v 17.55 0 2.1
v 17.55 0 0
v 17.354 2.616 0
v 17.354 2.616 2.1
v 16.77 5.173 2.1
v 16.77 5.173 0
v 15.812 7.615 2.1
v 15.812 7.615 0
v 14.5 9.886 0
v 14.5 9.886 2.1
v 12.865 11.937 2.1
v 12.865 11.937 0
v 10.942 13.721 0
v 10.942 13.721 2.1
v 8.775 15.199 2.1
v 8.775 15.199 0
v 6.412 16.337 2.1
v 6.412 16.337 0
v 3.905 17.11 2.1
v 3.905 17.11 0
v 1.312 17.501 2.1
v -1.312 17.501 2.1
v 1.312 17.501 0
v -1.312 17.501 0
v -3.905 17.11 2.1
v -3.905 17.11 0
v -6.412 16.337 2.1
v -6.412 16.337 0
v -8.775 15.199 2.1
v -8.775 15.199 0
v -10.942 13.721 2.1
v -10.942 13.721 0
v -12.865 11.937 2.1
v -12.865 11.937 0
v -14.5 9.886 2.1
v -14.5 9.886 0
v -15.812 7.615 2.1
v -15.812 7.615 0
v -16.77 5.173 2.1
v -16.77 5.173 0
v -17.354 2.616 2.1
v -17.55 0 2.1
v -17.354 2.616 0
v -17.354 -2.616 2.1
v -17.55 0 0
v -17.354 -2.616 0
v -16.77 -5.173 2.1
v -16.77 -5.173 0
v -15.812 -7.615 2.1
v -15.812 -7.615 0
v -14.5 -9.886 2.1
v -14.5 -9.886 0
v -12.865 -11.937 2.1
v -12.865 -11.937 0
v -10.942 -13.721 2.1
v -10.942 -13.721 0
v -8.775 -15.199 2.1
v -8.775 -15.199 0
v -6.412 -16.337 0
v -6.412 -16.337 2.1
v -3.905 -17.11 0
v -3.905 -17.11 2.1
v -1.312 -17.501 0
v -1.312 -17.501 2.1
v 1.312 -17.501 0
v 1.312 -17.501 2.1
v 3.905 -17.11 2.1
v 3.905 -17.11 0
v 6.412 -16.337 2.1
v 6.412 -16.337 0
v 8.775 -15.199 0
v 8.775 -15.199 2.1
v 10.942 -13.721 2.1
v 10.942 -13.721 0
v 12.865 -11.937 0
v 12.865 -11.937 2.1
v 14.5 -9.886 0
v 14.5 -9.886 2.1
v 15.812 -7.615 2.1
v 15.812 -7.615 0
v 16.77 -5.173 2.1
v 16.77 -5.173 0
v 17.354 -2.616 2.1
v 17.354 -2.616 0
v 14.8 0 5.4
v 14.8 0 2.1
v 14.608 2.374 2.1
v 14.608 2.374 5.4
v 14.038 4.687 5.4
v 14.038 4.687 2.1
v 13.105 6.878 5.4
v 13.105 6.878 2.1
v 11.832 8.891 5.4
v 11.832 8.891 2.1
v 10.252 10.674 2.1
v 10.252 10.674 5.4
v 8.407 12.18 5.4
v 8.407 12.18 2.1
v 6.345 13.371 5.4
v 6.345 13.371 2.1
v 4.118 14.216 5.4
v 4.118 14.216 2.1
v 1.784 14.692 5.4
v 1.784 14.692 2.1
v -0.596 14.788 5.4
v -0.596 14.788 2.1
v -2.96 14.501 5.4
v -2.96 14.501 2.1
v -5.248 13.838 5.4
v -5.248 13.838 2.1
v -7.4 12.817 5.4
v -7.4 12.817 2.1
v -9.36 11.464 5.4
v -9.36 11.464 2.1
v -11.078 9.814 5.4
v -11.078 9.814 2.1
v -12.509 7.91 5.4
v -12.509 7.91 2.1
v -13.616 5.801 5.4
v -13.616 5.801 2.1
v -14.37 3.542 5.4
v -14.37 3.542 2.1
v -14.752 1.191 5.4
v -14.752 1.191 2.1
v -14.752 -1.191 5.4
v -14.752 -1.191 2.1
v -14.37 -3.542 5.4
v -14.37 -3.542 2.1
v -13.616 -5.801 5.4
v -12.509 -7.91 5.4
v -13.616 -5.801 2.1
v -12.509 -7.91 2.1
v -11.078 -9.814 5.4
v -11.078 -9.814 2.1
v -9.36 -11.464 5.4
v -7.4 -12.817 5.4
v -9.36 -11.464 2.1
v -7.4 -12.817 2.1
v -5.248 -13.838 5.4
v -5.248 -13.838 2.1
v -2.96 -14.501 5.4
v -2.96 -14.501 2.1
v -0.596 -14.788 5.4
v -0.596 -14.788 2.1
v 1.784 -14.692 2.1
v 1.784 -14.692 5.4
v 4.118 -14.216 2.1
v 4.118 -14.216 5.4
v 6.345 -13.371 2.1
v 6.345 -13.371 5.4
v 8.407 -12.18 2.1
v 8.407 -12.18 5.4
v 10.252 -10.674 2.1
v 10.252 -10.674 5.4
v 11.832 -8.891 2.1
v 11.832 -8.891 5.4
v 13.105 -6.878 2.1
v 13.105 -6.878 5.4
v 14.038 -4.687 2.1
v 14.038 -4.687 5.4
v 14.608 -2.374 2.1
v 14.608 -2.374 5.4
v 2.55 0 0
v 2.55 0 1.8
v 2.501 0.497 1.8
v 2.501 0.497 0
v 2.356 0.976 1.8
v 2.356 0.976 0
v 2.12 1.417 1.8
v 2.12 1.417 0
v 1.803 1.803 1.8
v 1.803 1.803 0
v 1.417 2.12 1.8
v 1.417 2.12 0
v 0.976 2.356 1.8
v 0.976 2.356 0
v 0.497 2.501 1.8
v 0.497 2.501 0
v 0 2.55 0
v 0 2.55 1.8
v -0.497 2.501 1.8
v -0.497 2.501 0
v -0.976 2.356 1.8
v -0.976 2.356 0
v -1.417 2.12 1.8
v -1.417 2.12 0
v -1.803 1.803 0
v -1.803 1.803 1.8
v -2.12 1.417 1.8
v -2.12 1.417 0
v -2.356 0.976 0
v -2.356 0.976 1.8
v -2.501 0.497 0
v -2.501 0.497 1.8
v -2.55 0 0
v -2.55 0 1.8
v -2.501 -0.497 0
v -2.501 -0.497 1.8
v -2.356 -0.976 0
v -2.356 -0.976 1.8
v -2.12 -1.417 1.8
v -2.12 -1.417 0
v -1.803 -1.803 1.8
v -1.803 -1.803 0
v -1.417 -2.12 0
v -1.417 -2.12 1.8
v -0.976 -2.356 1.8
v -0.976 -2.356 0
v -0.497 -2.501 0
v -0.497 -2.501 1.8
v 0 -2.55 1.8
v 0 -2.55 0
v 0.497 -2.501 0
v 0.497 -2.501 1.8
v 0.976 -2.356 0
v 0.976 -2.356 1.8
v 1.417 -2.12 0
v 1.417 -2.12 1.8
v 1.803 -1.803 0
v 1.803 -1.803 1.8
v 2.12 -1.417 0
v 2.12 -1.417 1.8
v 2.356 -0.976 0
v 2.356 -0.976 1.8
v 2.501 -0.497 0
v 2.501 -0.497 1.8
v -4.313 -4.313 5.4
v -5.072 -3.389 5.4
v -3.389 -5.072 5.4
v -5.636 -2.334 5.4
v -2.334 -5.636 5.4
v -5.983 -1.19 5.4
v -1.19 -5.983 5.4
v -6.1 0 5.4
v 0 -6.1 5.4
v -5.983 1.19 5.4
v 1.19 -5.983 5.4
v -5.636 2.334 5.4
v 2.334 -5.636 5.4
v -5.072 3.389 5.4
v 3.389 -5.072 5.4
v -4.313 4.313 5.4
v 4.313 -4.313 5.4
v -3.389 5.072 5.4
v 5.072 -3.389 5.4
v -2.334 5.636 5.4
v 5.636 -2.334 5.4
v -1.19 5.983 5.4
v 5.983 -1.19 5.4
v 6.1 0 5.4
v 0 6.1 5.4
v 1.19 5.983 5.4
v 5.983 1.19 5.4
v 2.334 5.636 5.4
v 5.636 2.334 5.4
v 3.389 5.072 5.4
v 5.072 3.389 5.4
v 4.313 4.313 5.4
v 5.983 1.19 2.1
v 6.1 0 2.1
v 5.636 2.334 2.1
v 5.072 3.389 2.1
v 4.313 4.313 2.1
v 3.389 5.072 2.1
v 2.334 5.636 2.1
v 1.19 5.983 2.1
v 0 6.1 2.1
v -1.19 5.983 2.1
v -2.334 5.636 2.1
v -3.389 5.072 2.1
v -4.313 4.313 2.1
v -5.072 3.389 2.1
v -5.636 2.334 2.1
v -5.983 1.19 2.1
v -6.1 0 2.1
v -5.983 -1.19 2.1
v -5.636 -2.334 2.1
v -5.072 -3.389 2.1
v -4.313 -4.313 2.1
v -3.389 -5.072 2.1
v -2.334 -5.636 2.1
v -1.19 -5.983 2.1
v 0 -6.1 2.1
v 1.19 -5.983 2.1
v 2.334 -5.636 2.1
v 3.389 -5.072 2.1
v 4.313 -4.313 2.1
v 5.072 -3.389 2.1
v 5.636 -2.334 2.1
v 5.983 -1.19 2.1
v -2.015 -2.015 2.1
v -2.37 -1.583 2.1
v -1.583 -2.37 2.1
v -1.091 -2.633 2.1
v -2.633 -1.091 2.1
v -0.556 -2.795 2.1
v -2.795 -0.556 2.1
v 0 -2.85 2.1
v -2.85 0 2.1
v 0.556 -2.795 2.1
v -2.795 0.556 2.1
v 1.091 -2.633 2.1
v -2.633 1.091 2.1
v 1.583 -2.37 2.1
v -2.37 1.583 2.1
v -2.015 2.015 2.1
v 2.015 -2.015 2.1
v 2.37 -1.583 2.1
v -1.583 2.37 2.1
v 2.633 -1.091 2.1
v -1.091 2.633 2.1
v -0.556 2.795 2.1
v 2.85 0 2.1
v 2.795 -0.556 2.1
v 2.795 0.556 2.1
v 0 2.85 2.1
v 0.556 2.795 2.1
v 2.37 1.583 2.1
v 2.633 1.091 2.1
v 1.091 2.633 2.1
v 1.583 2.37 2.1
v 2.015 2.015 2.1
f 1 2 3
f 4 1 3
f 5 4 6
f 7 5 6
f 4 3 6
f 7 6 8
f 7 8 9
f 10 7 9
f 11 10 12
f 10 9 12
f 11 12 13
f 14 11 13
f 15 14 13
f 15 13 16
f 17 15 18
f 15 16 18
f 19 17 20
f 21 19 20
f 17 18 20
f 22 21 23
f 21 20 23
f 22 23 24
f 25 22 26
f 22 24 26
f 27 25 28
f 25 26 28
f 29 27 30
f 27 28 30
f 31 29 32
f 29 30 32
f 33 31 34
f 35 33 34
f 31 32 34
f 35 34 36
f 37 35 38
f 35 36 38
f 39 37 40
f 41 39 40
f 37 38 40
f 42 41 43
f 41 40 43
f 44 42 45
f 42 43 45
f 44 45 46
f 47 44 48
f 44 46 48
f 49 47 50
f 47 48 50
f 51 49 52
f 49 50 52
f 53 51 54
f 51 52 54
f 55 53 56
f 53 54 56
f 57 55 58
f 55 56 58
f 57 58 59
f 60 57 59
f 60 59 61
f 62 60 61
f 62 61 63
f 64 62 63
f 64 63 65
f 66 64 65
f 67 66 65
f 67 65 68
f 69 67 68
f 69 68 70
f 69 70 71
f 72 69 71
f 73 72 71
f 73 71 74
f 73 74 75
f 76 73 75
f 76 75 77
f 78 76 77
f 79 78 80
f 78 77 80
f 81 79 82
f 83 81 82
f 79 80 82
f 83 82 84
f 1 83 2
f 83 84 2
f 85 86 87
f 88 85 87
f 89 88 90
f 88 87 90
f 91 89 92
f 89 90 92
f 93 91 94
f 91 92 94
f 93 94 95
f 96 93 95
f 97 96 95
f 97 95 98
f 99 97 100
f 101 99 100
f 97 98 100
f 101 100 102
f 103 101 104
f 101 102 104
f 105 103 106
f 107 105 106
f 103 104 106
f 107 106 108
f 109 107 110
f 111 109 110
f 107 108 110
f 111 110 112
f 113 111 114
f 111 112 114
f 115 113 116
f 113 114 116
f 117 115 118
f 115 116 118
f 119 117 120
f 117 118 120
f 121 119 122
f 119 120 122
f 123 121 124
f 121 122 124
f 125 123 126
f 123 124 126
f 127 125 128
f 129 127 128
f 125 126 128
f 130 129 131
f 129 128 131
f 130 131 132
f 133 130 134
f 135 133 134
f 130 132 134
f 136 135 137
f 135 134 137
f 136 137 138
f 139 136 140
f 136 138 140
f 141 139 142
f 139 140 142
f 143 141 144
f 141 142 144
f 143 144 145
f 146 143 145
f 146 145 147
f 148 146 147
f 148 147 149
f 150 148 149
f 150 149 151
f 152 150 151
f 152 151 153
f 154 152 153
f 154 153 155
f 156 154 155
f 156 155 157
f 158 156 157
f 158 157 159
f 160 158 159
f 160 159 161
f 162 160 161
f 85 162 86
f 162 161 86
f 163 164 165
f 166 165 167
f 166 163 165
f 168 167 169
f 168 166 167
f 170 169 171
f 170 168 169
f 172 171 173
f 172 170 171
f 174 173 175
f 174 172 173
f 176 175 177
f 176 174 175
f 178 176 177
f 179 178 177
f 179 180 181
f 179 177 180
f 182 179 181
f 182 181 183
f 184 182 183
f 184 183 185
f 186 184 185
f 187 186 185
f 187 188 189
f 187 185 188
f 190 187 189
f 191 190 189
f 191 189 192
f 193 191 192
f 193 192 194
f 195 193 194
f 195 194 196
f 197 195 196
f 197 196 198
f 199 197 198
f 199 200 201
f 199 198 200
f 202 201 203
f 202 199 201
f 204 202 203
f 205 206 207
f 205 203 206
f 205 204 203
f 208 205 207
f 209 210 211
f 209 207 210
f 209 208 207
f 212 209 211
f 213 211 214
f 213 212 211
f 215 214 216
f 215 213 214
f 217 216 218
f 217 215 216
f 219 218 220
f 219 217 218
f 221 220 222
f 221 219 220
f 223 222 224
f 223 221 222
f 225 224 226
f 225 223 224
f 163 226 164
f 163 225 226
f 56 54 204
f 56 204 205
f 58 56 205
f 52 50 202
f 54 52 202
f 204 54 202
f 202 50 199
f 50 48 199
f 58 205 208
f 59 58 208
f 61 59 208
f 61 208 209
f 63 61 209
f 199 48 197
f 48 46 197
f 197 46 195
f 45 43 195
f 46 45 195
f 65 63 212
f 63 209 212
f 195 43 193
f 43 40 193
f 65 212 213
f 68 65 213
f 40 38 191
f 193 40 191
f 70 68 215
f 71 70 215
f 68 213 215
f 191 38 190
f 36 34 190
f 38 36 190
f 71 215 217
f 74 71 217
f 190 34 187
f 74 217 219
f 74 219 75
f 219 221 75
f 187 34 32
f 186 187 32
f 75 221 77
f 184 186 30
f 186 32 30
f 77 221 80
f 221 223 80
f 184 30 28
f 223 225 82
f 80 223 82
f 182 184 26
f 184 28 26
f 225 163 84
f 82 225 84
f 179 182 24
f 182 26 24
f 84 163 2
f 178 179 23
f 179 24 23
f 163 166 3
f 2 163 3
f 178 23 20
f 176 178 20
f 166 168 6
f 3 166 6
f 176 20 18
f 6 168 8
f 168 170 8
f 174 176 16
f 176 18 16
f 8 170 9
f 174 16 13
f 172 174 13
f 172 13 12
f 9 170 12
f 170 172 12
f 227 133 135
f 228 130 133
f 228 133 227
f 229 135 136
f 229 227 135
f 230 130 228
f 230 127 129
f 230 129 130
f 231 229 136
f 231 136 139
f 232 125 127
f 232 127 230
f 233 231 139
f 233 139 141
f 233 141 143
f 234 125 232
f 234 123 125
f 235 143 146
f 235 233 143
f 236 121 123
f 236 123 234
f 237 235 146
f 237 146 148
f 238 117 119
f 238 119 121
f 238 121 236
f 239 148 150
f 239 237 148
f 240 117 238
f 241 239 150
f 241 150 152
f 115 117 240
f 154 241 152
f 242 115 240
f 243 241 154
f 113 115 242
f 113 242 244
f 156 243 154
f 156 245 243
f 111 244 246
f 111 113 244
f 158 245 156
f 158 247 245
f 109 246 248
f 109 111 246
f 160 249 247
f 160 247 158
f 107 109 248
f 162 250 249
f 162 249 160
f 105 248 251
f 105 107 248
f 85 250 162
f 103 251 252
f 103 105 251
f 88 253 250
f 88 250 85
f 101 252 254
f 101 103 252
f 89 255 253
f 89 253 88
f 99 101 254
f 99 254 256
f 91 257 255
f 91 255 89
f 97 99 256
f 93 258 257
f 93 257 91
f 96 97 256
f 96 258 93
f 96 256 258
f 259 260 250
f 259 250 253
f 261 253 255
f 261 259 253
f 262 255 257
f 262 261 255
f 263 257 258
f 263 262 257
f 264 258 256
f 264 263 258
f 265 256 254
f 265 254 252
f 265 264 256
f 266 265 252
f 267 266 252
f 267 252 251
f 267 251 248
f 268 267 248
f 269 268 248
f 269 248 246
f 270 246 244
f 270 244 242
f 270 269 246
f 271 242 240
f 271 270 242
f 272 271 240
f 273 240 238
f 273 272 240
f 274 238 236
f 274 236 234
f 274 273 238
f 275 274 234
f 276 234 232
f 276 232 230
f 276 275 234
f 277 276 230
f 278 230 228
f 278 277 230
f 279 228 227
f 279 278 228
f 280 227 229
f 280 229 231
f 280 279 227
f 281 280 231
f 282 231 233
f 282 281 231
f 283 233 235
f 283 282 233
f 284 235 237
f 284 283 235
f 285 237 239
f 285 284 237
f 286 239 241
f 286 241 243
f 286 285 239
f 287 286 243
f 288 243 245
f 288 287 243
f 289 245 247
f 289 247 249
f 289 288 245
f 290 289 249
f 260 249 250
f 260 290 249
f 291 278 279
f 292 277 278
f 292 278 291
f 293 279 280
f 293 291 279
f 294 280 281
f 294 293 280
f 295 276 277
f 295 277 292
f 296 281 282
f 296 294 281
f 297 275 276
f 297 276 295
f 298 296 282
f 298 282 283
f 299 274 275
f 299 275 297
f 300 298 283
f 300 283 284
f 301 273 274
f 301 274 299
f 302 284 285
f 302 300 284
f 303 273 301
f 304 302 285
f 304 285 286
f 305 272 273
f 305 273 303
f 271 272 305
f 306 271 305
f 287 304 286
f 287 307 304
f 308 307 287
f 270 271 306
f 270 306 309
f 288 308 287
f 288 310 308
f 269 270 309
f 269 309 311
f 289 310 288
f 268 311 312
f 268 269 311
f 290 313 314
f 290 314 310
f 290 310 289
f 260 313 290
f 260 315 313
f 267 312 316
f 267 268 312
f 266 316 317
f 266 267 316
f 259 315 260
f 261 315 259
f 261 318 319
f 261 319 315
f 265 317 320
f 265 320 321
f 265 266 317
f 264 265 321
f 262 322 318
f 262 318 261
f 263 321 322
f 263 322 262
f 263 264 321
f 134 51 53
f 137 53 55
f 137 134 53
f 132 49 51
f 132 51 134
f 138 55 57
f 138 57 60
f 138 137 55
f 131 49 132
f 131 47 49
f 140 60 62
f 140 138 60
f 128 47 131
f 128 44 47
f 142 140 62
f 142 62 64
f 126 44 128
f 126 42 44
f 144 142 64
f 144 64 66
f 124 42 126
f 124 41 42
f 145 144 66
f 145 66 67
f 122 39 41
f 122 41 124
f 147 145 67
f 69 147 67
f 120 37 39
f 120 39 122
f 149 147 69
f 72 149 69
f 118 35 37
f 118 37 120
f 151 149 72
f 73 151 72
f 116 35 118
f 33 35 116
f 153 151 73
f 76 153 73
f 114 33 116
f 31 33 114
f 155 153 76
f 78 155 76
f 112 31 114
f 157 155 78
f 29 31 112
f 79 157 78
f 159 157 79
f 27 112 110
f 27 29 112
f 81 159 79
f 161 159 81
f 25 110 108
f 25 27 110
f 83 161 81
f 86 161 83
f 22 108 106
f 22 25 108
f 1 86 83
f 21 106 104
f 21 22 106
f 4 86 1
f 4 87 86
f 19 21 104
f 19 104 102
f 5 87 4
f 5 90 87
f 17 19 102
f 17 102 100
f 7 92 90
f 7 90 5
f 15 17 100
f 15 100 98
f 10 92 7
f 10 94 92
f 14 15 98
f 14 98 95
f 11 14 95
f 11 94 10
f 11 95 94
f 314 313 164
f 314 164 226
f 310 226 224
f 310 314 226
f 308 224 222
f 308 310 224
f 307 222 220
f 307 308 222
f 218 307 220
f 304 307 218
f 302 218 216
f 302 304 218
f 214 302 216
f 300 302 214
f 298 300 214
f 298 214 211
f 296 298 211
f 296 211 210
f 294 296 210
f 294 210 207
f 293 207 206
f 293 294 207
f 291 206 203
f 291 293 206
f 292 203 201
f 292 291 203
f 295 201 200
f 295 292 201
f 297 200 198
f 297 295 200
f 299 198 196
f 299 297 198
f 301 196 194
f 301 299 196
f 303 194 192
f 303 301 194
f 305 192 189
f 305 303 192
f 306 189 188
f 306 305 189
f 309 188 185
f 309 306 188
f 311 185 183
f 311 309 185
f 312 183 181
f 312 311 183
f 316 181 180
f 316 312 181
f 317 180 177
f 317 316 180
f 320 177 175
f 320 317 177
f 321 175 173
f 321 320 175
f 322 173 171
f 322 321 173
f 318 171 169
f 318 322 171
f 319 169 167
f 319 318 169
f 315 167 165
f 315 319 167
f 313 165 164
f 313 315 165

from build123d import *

# Parameters (mm, degrees)
SKETCH_1_R          = 17.55
EXTRUDE_1_DEPTH     = 2.1
EXTRUDE_START       = 2.1
SKETCH_2_R          = 14.8
SKETCH_2_R_2        = 6.1
EXTRUDE_2_DEPTH     = 3.3
CUT_EXTRUDE_1_REACH = 7.4
SKETCH_3_R          = 2.55
CHAMFER_1_SIZE      = 0.3


with BuildPart() as part:
    # 草图1 → 凸台-拉伸1 (new body)
    with BuildSketch(Plane.XY):
        Circle(SKETCH_1_R)
    extrude(amount=EXTRUDE_1_DEPTH)

    # 草图2 → 凸台-拉伸2 (add)
    with BuildSketch(Plane.XY.offset(EXTRUDE_START)):
        Circle(SKETCH_2_R)
        Circle(SKETCH_2_R_2, mode=Mode.SUBTRACT)
    extrude(amount=EXTRUDE_2_DEPTH)

    # 草图3 → 切除-拉伸1 (cut, up to next)
    with BuildSketch(Plane.XY, mode=Mode.PRIVATE) as cut_extrude_1_sk1:
        Circle(SKETCH_3_R)
    cut_extrude_1_tool1 = extrude(cut_extrude_1_sk1.sketch, amount=CUT_EXTRUDE_1_REACH, mode=Mode.PRIVATE) & part.part
    add(cut_extrude_1_tool1.solids().sort_by_distance((0, 0, 0))[0], mode=Mode.SUBTRACT)

    # 倒角1
    chamfer_1_edges = [part.edges().sort_by_distance(p)[0] for p in [
        (-2.55, 0, 2.1),
    ]]
    chamfer(chamfer_1_edges, length=CHAMFER_1_SIZE)


solid = part.part
